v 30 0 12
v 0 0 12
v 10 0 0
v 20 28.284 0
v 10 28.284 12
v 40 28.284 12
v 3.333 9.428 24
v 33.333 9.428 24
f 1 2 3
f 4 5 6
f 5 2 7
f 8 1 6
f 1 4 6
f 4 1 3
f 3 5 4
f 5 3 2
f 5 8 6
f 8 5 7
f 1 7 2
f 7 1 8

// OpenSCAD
// SCD biprism, one physical handedness. No clearance or connectors.
side = 30; h = 2/5; lambda = 1/3;
a = [1,0,0]; b = [1/3,2*sqrt(2)/3,0];
c = lambda*b + [0,0,h]; d = lambda*a - [0,0,h];
scale(side) translate([0,0,h])
polyhedron(points=[[0,0,0],a,b,a+b,c,a+c,d,b+d],
  faces=[[6, 0, 1], [3, 2, 7], [4, 0, 2], [3, 1, 5], [6, 1, 3, 7], [2, 0, 6, 7], [4, 2, 3, 5], [5, 1, 0, 4]]);
